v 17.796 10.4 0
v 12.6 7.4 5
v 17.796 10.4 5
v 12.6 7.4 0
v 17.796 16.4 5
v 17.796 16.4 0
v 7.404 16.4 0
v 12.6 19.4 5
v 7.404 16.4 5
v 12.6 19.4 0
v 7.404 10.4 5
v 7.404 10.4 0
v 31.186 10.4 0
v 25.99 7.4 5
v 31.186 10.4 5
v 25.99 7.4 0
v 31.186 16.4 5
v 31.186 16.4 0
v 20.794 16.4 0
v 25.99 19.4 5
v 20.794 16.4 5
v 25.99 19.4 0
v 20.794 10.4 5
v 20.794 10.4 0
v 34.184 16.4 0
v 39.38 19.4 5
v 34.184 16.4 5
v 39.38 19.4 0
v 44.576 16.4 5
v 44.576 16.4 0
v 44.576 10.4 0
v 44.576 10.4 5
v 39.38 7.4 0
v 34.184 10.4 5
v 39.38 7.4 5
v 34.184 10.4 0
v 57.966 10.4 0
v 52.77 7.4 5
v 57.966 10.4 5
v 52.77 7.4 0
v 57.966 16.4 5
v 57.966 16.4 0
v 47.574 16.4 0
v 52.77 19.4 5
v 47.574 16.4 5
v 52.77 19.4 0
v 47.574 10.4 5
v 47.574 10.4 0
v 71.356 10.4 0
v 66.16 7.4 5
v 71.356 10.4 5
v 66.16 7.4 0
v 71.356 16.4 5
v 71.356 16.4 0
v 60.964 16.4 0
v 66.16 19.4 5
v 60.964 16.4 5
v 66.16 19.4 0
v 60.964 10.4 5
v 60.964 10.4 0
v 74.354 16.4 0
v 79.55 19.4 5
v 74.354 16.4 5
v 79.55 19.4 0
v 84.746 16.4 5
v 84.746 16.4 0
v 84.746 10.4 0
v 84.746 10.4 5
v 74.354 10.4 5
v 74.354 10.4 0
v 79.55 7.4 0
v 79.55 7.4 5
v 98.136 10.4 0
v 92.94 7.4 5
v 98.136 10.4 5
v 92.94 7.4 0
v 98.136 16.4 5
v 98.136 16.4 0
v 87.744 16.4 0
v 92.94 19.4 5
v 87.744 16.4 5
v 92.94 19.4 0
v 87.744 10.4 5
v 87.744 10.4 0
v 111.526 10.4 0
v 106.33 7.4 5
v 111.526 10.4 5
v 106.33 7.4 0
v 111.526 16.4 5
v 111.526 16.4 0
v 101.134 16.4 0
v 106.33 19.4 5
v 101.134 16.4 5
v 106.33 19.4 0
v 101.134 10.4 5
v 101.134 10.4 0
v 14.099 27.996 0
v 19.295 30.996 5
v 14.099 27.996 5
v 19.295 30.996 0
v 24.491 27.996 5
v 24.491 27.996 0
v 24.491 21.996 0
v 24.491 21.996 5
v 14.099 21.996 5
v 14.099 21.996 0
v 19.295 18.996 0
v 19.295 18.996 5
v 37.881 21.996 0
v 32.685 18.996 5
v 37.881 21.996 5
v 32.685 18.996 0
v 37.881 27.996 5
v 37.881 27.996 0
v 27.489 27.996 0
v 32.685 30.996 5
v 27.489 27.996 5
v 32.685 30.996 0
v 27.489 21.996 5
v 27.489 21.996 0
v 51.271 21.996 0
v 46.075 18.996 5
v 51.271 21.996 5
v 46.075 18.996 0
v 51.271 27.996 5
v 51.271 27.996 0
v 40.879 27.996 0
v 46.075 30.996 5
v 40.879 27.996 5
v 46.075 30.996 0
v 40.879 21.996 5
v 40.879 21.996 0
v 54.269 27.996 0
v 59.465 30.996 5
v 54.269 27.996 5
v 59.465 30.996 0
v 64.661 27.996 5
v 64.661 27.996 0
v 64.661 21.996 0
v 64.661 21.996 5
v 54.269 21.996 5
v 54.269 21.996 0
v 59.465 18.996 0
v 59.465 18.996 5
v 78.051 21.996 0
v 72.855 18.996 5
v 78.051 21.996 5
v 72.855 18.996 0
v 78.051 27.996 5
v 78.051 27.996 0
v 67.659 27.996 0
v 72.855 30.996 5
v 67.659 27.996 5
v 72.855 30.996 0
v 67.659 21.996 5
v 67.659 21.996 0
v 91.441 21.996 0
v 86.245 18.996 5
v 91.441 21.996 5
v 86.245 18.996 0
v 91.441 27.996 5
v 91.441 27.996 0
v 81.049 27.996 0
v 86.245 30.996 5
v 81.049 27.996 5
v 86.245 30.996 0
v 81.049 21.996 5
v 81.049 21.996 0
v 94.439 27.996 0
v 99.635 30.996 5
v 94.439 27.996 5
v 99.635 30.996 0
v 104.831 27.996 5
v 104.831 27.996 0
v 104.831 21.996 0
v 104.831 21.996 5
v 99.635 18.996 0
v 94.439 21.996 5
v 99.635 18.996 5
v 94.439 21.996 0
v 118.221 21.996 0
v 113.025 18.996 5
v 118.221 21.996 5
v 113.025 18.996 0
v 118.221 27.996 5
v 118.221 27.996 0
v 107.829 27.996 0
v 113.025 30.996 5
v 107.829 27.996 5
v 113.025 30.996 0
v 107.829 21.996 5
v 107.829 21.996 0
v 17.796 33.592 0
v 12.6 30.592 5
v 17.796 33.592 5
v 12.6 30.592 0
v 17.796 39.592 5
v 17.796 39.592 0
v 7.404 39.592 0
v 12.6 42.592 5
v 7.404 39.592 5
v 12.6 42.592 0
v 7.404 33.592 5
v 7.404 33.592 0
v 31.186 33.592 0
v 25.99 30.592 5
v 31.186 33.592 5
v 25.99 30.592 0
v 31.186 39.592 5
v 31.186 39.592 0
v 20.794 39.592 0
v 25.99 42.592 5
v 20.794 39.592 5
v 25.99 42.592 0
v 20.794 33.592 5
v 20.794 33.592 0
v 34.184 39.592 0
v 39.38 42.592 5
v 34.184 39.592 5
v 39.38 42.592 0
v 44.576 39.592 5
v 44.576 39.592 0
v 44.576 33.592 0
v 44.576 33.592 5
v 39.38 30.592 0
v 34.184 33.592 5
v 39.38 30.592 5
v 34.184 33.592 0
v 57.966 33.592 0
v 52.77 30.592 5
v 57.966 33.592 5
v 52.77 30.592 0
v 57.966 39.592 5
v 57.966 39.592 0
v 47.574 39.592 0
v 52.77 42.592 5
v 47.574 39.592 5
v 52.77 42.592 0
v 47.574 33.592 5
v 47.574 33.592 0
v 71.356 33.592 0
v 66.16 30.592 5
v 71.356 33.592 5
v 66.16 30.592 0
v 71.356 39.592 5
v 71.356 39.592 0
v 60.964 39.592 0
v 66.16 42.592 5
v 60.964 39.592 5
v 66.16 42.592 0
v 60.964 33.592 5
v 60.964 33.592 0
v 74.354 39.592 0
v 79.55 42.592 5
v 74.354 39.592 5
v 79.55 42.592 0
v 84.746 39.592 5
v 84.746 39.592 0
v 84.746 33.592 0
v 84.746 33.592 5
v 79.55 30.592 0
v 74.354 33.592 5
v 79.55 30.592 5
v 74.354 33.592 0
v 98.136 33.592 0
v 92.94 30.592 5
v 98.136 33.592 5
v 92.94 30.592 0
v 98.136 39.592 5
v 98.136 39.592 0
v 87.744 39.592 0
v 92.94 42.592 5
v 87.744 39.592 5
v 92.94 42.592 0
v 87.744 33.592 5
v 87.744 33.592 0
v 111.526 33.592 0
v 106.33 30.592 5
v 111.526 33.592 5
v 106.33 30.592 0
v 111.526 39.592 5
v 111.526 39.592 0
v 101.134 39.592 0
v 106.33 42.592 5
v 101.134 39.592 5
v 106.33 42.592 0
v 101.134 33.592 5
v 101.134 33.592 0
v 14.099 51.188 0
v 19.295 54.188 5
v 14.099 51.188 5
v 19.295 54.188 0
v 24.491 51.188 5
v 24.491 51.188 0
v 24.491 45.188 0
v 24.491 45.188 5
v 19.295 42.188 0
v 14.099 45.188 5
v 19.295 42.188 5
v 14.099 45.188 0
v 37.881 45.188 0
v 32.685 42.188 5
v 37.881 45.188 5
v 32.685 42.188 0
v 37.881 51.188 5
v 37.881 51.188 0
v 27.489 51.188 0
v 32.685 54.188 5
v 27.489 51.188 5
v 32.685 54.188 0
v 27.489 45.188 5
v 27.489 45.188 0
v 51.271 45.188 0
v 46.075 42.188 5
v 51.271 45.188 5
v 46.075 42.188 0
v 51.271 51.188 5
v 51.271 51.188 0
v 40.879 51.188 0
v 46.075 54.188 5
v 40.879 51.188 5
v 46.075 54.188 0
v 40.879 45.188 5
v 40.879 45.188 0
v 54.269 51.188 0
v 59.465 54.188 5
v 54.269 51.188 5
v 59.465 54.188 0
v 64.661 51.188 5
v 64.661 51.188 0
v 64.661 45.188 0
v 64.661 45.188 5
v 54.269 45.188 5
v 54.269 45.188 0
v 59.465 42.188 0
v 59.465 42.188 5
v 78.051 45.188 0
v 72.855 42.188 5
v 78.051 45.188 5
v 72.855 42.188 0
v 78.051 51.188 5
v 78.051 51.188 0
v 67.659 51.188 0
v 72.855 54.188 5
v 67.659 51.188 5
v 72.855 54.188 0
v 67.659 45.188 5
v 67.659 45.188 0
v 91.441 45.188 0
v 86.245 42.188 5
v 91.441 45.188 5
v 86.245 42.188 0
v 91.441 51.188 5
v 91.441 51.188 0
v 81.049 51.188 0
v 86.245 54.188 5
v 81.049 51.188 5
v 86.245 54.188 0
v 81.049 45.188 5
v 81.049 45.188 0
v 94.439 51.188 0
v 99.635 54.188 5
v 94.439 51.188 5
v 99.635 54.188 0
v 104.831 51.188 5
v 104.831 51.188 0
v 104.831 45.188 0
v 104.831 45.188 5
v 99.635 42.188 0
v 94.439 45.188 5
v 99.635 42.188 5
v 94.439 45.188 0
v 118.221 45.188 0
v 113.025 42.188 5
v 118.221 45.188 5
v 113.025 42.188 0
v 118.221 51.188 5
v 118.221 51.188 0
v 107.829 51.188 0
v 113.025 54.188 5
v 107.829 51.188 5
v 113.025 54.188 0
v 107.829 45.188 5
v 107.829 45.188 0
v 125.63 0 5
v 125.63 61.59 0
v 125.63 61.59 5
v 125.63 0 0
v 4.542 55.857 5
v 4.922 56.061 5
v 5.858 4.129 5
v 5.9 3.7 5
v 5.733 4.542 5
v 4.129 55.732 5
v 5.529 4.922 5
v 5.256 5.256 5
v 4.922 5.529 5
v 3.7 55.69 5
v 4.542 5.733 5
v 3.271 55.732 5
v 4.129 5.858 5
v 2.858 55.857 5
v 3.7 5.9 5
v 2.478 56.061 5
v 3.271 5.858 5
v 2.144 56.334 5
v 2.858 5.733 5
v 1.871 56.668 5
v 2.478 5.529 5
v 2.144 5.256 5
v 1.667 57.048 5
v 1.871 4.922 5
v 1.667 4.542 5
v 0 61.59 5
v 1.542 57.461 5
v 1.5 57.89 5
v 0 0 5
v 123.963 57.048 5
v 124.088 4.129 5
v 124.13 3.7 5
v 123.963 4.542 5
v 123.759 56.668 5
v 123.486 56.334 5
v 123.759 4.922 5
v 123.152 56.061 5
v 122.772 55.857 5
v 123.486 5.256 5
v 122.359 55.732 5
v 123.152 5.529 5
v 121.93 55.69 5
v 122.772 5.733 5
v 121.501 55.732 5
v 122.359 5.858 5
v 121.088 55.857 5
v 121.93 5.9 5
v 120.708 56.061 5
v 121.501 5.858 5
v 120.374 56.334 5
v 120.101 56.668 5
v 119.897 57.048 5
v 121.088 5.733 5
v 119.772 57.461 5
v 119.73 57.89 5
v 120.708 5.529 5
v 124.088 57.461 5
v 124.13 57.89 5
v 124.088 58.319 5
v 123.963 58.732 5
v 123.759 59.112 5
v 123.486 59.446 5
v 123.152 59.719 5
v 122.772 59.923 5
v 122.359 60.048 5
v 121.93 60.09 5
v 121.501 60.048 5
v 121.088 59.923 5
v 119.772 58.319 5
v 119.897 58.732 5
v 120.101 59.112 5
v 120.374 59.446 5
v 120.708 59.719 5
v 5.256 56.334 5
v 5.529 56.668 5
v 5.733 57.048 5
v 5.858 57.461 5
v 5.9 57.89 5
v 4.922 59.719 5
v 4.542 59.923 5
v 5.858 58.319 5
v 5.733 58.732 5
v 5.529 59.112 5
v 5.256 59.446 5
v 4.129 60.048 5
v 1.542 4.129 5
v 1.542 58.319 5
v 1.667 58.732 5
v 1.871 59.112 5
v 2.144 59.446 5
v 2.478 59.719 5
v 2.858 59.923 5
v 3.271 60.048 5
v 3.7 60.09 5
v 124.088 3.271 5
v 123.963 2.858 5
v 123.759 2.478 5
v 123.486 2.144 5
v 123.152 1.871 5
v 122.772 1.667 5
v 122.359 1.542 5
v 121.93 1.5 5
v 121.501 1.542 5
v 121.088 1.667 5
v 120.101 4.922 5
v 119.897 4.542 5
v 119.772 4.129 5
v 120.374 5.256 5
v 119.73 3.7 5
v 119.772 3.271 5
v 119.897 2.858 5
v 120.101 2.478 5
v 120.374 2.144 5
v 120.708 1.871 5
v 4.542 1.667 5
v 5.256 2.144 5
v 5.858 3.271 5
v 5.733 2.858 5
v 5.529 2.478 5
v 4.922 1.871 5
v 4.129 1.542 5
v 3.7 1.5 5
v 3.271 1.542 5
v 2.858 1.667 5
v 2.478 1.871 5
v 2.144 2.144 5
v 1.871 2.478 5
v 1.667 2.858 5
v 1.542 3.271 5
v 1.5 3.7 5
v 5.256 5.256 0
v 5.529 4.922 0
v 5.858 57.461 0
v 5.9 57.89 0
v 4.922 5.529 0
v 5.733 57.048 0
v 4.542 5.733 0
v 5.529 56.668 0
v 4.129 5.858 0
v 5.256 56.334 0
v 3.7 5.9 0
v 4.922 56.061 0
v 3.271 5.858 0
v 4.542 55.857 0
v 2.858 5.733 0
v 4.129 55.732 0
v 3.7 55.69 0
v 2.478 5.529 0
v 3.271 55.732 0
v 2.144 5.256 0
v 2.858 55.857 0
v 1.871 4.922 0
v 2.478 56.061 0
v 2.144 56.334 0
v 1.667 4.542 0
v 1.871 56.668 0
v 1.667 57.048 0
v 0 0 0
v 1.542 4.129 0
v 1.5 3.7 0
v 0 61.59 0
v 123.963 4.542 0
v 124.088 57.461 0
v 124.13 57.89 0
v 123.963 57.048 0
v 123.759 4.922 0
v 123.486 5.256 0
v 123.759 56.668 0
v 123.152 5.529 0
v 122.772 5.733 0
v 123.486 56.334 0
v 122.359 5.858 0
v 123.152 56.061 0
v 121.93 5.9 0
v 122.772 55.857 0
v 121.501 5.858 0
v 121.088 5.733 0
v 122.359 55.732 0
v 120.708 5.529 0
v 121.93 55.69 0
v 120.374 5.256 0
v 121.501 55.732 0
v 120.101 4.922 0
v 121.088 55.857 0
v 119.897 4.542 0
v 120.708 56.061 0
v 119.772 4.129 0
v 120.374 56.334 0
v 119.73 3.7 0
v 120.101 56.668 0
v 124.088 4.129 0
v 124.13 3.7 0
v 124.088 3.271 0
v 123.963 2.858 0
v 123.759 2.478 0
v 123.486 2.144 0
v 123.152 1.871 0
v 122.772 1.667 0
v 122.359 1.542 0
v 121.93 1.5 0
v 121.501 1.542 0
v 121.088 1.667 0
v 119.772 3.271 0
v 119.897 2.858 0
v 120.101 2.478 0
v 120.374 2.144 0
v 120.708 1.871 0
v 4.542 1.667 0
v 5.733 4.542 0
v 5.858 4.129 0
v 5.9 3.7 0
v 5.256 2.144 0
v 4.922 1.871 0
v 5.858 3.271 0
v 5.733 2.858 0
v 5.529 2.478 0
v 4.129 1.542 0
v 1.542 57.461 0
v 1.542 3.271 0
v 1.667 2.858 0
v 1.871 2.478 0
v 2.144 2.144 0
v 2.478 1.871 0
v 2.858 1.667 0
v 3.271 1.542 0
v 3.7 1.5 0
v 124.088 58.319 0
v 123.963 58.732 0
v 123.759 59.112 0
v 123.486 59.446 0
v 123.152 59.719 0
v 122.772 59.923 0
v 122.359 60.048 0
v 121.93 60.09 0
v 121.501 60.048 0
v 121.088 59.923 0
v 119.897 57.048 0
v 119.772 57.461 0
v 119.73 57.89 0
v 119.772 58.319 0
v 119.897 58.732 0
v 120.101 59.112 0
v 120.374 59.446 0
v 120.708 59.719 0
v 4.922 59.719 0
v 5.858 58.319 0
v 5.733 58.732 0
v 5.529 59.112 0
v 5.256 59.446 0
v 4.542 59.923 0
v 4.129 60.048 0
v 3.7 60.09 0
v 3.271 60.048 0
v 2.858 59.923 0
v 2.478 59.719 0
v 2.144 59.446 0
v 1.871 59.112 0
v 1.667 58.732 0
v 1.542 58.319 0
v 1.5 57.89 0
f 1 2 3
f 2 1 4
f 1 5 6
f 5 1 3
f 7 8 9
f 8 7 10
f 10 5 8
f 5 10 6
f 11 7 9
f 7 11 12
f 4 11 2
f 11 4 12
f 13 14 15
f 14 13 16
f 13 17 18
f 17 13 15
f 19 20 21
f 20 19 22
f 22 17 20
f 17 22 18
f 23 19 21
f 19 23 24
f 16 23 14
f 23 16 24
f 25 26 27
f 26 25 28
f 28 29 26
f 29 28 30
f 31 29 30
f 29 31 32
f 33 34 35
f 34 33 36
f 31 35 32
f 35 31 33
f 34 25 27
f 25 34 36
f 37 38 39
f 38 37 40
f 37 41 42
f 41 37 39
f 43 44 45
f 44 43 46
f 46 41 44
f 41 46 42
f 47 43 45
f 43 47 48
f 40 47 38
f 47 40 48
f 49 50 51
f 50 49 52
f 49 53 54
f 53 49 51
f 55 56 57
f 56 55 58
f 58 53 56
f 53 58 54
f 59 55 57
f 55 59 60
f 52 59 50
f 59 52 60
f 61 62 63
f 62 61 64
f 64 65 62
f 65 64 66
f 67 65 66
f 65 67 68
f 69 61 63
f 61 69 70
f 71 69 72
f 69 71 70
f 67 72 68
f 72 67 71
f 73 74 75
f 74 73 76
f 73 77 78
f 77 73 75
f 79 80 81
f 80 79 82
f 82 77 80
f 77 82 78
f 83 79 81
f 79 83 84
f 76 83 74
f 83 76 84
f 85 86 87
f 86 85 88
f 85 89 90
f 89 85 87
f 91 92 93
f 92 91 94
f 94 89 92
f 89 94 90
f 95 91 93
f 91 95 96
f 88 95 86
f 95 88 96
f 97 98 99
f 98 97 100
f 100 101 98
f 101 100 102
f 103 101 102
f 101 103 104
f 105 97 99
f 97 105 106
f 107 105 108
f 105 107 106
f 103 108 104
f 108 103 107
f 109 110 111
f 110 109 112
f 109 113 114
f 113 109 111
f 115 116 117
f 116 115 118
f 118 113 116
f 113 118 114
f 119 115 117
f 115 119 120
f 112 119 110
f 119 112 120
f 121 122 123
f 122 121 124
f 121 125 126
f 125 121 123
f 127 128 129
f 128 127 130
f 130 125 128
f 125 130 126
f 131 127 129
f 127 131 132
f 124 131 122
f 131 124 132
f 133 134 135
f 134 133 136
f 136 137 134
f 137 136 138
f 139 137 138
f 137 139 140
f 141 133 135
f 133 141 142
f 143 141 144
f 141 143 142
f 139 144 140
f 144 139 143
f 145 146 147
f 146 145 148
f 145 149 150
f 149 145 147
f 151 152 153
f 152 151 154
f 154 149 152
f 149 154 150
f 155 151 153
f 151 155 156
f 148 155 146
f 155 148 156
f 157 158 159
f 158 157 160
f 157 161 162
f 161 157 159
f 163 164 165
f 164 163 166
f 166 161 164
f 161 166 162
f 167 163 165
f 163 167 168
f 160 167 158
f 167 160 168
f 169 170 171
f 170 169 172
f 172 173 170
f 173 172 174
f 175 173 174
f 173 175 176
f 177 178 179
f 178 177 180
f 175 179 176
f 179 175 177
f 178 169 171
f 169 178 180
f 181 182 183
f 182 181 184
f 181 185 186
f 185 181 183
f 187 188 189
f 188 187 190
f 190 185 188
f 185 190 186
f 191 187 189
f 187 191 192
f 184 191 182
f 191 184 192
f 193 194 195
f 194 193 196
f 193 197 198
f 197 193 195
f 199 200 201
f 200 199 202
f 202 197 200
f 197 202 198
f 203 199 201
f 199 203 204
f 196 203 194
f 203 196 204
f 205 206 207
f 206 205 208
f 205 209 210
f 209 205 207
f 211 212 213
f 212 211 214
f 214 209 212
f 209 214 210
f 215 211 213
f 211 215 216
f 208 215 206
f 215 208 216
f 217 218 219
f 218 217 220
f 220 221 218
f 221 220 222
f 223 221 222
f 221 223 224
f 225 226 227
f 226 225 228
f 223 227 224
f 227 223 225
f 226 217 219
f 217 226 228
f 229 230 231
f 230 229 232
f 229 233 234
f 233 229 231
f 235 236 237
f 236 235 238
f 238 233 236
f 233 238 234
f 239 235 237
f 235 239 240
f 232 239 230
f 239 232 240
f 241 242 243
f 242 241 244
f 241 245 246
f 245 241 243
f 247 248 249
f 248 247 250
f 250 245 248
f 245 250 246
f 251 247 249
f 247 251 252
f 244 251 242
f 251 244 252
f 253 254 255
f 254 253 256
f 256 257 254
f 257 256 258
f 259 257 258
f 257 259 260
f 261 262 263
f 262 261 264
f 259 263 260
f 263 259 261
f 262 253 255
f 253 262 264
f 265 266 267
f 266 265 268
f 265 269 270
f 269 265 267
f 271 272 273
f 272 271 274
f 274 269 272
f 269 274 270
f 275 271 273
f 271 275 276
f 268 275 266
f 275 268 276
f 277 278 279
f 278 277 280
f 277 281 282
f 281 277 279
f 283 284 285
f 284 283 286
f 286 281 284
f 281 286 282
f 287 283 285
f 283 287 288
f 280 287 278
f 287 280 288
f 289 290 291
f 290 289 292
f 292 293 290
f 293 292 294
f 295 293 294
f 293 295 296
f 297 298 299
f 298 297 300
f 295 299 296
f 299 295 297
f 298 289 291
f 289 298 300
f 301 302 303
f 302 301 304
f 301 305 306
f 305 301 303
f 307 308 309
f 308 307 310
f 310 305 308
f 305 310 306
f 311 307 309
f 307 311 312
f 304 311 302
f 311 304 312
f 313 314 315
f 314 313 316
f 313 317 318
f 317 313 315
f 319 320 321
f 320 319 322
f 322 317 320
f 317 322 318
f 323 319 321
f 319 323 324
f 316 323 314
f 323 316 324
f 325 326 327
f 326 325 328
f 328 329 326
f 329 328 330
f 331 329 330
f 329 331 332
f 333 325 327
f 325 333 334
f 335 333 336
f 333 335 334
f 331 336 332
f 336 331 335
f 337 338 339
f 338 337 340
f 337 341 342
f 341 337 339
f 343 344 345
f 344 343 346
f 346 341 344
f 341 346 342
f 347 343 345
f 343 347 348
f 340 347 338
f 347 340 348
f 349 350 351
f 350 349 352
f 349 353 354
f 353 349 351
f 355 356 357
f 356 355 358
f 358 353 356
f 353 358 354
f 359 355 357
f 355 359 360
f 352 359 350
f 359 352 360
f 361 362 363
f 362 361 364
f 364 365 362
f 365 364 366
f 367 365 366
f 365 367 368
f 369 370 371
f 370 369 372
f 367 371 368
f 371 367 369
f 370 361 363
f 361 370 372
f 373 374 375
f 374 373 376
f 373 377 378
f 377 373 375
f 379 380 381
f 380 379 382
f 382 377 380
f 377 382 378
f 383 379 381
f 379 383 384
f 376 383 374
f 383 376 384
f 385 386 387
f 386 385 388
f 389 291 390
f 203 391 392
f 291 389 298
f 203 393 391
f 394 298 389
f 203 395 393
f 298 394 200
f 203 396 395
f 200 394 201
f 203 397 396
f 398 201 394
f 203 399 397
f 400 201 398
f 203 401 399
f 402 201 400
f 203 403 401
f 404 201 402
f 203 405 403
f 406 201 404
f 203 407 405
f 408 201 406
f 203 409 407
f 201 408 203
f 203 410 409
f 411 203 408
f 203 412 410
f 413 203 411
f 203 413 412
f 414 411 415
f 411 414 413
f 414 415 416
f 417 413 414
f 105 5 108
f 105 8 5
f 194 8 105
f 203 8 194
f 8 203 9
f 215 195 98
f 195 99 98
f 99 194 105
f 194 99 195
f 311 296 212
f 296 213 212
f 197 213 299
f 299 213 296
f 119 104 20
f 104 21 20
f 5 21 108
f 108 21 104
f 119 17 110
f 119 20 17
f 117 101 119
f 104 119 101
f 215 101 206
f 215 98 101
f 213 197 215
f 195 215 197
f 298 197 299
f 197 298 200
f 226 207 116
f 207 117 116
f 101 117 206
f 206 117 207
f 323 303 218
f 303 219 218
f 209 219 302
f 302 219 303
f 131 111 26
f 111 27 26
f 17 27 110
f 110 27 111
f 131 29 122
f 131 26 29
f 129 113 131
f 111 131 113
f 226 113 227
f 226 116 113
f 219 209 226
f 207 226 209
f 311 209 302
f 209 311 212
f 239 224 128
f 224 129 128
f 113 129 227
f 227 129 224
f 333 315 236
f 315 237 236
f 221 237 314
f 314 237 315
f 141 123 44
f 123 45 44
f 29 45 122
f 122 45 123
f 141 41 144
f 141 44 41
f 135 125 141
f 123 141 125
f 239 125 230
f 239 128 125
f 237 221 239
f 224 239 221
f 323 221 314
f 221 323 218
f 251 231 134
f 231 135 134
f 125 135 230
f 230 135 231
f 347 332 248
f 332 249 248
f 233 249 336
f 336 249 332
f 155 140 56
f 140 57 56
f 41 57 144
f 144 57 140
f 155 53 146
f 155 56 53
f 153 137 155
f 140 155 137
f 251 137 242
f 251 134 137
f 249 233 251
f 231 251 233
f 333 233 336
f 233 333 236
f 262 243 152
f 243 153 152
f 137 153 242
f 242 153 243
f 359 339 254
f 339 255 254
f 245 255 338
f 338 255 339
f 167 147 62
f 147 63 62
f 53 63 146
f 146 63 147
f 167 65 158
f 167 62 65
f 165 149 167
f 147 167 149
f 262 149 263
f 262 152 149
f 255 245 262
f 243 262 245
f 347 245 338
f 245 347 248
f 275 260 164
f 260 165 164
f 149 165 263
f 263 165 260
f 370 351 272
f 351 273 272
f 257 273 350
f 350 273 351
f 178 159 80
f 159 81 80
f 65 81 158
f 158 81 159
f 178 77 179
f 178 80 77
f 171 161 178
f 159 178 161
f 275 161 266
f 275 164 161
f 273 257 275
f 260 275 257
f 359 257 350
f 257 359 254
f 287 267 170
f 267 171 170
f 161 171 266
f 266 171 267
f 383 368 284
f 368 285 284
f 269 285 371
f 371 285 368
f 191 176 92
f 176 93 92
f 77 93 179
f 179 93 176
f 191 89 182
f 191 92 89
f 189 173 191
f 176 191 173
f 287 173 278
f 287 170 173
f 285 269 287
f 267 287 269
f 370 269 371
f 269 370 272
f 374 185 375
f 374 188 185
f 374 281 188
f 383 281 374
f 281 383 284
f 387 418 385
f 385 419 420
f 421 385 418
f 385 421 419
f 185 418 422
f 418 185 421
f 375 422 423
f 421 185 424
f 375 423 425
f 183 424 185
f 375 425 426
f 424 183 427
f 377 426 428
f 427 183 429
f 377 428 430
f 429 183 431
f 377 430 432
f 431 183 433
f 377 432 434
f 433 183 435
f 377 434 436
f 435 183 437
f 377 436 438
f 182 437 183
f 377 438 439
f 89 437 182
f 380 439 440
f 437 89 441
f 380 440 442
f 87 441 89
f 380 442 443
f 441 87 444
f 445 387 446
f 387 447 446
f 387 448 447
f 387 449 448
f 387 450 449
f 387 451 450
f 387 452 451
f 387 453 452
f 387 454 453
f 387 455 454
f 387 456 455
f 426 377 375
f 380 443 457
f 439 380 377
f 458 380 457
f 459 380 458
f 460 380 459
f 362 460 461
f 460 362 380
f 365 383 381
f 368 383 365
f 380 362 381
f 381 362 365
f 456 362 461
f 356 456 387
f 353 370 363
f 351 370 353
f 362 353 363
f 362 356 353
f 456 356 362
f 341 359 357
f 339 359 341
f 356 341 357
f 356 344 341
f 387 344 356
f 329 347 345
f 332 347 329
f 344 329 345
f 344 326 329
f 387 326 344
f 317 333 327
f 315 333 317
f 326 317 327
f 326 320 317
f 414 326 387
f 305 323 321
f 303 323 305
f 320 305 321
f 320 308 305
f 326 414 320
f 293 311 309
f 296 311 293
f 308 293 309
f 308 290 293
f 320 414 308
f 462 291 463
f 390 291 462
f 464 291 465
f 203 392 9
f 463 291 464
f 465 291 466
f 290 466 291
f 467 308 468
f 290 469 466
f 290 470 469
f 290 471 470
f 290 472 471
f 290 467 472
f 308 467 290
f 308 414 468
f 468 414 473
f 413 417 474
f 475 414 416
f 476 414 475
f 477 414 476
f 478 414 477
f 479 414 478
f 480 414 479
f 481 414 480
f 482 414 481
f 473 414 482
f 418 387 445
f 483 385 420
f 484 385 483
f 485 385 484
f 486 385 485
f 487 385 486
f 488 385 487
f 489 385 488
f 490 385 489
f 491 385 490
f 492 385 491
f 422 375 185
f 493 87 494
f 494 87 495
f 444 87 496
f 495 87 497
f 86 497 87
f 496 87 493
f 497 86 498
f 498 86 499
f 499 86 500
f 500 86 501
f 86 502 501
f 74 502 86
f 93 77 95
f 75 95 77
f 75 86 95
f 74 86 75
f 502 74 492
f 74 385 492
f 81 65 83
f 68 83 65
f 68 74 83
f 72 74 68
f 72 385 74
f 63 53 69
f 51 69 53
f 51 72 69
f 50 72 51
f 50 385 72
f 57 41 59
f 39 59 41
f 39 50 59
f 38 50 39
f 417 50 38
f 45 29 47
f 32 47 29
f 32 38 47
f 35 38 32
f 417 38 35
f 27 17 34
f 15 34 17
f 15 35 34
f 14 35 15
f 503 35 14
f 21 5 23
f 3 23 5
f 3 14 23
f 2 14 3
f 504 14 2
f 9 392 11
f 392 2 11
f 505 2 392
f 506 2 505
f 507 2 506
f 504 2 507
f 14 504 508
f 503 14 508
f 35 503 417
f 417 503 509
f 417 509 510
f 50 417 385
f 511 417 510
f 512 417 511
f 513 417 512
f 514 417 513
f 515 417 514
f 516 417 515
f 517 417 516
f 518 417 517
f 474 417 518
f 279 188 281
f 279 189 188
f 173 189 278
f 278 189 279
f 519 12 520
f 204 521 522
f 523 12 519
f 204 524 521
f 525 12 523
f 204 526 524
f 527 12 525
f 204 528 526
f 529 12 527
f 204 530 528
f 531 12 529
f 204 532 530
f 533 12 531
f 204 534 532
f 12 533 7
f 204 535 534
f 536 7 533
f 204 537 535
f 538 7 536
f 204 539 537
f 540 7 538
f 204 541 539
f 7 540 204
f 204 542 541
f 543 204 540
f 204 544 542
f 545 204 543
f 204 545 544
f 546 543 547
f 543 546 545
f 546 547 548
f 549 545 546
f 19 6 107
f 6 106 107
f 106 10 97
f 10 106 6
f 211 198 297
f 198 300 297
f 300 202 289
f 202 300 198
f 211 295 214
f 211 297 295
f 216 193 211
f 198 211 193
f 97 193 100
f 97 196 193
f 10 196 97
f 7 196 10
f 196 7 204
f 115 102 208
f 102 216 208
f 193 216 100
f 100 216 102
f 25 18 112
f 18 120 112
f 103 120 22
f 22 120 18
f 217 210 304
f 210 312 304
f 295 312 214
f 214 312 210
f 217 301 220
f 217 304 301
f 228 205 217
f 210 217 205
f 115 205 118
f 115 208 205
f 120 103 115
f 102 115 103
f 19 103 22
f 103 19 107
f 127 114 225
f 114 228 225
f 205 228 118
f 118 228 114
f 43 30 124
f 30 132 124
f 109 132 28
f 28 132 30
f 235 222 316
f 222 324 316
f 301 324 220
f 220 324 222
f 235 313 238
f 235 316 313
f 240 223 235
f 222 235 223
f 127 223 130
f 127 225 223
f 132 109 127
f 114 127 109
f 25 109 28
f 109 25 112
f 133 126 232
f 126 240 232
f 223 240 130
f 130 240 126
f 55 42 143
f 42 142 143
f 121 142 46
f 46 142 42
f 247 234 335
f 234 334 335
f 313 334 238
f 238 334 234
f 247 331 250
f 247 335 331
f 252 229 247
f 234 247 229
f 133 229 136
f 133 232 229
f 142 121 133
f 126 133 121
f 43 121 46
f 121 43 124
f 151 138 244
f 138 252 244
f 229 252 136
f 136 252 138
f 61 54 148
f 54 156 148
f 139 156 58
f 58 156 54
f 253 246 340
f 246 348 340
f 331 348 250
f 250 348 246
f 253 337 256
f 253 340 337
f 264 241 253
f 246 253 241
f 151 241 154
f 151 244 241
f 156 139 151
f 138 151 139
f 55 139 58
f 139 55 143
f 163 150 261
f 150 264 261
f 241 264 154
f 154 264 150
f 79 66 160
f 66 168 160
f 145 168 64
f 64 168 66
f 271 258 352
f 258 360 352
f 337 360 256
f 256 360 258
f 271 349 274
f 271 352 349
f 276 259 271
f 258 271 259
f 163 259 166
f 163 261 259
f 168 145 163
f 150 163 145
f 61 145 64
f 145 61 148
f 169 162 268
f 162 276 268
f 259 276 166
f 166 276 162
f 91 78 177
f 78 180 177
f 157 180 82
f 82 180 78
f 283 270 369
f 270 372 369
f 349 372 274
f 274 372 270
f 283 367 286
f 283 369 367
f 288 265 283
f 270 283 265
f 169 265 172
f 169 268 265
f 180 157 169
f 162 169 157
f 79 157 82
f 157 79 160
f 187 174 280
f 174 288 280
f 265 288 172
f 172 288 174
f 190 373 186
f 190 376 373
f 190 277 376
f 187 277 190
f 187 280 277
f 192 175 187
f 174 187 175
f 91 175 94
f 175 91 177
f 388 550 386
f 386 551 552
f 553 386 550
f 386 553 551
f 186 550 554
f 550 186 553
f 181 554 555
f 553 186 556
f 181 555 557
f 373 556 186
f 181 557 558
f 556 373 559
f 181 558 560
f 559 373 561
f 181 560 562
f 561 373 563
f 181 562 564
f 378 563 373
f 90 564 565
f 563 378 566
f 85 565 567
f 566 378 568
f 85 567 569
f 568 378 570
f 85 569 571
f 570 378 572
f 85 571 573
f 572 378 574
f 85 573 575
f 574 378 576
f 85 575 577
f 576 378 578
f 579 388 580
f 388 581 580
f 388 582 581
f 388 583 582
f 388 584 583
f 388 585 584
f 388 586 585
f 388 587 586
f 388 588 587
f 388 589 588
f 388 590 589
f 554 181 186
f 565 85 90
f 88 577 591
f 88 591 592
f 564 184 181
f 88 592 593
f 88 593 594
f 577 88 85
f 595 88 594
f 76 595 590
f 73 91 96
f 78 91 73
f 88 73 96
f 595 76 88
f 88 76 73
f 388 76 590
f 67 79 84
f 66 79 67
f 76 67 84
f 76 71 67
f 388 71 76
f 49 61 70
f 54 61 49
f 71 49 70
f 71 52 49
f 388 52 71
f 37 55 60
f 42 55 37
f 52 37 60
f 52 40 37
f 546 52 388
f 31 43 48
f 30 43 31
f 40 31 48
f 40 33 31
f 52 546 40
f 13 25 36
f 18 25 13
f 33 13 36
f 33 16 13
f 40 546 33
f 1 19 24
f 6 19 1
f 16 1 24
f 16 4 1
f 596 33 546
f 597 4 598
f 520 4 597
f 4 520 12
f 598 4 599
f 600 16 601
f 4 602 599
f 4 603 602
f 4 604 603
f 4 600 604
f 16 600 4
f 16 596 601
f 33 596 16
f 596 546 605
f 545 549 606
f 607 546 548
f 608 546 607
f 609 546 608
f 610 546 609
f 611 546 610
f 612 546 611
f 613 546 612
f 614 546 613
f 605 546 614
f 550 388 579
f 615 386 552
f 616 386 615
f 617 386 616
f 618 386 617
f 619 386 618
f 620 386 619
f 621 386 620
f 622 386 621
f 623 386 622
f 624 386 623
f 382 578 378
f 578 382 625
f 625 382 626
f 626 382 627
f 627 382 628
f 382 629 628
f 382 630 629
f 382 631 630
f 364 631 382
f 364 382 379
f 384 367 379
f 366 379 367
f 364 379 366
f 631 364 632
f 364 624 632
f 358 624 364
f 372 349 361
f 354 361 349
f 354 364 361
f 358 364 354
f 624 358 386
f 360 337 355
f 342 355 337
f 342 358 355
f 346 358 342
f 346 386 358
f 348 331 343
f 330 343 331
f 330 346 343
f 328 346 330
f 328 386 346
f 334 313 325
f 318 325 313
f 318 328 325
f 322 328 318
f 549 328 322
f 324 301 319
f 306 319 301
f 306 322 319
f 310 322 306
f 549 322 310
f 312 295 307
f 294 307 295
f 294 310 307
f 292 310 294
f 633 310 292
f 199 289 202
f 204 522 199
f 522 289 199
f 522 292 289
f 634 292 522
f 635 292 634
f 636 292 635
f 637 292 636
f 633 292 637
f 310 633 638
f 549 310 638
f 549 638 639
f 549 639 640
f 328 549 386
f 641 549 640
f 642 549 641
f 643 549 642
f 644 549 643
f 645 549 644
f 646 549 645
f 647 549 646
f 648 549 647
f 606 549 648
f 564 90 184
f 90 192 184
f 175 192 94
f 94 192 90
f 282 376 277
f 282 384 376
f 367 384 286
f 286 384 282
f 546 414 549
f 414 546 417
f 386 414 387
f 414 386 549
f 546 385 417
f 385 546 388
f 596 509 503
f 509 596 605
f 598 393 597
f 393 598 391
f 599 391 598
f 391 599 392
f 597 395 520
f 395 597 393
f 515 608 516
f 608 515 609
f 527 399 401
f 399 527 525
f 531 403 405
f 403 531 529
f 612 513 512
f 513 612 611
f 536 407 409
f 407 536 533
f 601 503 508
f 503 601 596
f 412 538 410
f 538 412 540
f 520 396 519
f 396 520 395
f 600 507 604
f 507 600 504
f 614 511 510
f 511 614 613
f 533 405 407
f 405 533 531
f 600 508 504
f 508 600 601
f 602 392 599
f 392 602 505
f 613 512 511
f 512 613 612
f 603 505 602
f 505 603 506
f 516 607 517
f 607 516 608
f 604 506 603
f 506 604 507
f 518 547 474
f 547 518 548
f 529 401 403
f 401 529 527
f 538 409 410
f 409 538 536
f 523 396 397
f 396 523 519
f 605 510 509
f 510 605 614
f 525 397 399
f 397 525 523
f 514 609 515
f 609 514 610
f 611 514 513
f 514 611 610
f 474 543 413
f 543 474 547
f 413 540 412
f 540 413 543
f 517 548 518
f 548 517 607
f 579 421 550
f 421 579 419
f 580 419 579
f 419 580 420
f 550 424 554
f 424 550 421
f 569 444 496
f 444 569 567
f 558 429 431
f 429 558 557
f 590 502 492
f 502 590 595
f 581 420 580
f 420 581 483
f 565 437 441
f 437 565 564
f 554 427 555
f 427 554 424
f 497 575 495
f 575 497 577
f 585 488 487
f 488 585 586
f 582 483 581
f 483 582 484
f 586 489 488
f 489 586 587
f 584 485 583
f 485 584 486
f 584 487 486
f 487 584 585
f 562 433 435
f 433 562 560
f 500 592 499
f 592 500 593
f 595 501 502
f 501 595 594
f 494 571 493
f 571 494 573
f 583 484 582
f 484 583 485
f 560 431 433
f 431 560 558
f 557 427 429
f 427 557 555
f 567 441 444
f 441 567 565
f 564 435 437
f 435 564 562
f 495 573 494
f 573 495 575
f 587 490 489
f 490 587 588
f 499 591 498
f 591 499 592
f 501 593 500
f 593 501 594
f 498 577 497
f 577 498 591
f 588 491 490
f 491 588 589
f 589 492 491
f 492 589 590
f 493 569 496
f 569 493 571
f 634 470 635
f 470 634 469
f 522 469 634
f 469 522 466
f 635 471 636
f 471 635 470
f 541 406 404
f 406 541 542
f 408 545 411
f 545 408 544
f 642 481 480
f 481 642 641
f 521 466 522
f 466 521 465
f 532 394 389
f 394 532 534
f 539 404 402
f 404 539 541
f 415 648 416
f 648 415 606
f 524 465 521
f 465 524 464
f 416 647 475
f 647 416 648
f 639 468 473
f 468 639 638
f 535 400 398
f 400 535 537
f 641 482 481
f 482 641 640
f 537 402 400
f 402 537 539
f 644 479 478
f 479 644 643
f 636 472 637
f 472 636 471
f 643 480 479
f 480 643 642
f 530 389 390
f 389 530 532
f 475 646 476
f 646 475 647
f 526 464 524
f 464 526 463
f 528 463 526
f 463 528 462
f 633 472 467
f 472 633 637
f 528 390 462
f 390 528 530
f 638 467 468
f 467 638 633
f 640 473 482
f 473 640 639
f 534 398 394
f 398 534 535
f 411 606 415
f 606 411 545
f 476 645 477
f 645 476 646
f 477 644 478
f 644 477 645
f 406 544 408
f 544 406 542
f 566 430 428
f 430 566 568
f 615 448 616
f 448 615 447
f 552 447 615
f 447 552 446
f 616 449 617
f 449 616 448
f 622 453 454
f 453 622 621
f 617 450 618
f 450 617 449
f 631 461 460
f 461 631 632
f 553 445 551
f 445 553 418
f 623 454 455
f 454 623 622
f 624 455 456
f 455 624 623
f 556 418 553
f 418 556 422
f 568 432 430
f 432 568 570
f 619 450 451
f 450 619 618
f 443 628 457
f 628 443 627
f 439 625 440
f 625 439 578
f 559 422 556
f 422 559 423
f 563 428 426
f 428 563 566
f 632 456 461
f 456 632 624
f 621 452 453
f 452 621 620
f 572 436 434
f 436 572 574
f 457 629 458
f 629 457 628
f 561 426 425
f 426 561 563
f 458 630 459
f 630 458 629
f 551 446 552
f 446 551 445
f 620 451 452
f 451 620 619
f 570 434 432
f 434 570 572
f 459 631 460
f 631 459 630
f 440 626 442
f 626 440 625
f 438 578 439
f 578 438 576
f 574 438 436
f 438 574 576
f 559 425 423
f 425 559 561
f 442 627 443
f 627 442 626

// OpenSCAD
$fn = 32;

// ----------------------------------------------------------------------
// Honeycomb panel: 125.63 x 61.59 mm, 32 cells of 12 mm
// ----------------------------------------------------------------------

// --- parameters (mm) ---
panel_w = 125.63;         // panel width
panel_d = 61.59;          // panel depth
thick = 5;                // panel thickness
cell_r = 6;               // hex cell circumradius
pitch = 13.39;            // hex cell pitch (centre to centre)
web = 3;                  // web between the cells
columns = 8;              // columns of cells
rows = 4;                 // rows of cells
cell_count = 32;          // total cells
shift_x = 12.6;           // first cell offset in x
shift_y = 13.4;           // first cell offset in y
mount_d = 4.4;            // corner mounting holes
hole_off = 3.7;           // mounting hole offset from the corners

difference() {
  union() {
    cube([panel_w, panel_d, thick]);
  }
  /* hexagonal cells, point-up, cut right through the plate */
  for (row = [0 : rows - 1]) {
    for (col = [0 : columns - 1]) {
      translate([shift_x + col * pitch + (row % 2) * pitch / 2, shift_y + row * pitch * 0.866025, -2.5]) rotate([0, 0, 30]) cylinder(h = thick + 5, d = 2 * cell_r, $fn = 6);
    }
  }
  /* corner mounting holes, clear of the outer cell web */
  translate([3.7, 3.7, -2.5]) cylinder(h = thick + 5, d = mount_d);
  translate([121.93, 3.7, -2.5]) cylinder(h = thick + 5, d = mount_d);
  translate([3.7, 57.89, -2.5]) cylinder(h = thick + 5, d = mount_d);
  translate([121.93, 57.89, -2.5]) cylinder(h = thick + 5, d = mount_d);
}
